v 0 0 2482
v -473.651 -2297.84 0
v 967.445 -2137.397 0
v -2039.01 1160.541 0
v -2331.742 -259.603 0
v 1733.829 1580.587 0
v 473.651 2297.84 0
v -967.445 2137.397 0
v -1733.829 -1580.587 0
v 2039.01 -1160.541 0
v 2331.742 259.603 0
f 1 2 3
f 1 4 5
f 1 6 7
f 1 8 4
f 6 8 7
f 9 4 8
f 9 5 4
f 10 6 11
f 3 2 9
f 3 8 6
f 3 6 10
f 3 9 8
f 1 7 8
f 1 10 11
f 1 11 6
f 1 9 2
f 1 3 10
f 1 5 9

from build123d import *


# Not quite as in the source:
# - the program builds the solid bodies; features that only make, move or delete a surface that nothing else refers to are left out


with BuildPart() as f3:
    # F1 (on Top) → F3 section 0
    with BuildSketch(Plane.XY, mode=Mode.PRIVATE) as f3_s0:
        Polygon((-2039.0098238841, 1160.5409943), (-2331.7424803501, -259.6025167011), (-1733.8287623343, -1580.5866898873), (-473.651387779, -2297.8404697023), (967.4447180893, -2137.397290816), (2039.0098238841, -1160.5409943), (2331.7424803501, 259.6025167011), (1733.8287623343, 1580.5866898873), (473.651387779, 2297.8404697023), (-967.4447180893, 2137.397290816), align=None)
    loft([f3_s0.sketch, Vertex(0, 0, 2482)])


solid = f3.part
